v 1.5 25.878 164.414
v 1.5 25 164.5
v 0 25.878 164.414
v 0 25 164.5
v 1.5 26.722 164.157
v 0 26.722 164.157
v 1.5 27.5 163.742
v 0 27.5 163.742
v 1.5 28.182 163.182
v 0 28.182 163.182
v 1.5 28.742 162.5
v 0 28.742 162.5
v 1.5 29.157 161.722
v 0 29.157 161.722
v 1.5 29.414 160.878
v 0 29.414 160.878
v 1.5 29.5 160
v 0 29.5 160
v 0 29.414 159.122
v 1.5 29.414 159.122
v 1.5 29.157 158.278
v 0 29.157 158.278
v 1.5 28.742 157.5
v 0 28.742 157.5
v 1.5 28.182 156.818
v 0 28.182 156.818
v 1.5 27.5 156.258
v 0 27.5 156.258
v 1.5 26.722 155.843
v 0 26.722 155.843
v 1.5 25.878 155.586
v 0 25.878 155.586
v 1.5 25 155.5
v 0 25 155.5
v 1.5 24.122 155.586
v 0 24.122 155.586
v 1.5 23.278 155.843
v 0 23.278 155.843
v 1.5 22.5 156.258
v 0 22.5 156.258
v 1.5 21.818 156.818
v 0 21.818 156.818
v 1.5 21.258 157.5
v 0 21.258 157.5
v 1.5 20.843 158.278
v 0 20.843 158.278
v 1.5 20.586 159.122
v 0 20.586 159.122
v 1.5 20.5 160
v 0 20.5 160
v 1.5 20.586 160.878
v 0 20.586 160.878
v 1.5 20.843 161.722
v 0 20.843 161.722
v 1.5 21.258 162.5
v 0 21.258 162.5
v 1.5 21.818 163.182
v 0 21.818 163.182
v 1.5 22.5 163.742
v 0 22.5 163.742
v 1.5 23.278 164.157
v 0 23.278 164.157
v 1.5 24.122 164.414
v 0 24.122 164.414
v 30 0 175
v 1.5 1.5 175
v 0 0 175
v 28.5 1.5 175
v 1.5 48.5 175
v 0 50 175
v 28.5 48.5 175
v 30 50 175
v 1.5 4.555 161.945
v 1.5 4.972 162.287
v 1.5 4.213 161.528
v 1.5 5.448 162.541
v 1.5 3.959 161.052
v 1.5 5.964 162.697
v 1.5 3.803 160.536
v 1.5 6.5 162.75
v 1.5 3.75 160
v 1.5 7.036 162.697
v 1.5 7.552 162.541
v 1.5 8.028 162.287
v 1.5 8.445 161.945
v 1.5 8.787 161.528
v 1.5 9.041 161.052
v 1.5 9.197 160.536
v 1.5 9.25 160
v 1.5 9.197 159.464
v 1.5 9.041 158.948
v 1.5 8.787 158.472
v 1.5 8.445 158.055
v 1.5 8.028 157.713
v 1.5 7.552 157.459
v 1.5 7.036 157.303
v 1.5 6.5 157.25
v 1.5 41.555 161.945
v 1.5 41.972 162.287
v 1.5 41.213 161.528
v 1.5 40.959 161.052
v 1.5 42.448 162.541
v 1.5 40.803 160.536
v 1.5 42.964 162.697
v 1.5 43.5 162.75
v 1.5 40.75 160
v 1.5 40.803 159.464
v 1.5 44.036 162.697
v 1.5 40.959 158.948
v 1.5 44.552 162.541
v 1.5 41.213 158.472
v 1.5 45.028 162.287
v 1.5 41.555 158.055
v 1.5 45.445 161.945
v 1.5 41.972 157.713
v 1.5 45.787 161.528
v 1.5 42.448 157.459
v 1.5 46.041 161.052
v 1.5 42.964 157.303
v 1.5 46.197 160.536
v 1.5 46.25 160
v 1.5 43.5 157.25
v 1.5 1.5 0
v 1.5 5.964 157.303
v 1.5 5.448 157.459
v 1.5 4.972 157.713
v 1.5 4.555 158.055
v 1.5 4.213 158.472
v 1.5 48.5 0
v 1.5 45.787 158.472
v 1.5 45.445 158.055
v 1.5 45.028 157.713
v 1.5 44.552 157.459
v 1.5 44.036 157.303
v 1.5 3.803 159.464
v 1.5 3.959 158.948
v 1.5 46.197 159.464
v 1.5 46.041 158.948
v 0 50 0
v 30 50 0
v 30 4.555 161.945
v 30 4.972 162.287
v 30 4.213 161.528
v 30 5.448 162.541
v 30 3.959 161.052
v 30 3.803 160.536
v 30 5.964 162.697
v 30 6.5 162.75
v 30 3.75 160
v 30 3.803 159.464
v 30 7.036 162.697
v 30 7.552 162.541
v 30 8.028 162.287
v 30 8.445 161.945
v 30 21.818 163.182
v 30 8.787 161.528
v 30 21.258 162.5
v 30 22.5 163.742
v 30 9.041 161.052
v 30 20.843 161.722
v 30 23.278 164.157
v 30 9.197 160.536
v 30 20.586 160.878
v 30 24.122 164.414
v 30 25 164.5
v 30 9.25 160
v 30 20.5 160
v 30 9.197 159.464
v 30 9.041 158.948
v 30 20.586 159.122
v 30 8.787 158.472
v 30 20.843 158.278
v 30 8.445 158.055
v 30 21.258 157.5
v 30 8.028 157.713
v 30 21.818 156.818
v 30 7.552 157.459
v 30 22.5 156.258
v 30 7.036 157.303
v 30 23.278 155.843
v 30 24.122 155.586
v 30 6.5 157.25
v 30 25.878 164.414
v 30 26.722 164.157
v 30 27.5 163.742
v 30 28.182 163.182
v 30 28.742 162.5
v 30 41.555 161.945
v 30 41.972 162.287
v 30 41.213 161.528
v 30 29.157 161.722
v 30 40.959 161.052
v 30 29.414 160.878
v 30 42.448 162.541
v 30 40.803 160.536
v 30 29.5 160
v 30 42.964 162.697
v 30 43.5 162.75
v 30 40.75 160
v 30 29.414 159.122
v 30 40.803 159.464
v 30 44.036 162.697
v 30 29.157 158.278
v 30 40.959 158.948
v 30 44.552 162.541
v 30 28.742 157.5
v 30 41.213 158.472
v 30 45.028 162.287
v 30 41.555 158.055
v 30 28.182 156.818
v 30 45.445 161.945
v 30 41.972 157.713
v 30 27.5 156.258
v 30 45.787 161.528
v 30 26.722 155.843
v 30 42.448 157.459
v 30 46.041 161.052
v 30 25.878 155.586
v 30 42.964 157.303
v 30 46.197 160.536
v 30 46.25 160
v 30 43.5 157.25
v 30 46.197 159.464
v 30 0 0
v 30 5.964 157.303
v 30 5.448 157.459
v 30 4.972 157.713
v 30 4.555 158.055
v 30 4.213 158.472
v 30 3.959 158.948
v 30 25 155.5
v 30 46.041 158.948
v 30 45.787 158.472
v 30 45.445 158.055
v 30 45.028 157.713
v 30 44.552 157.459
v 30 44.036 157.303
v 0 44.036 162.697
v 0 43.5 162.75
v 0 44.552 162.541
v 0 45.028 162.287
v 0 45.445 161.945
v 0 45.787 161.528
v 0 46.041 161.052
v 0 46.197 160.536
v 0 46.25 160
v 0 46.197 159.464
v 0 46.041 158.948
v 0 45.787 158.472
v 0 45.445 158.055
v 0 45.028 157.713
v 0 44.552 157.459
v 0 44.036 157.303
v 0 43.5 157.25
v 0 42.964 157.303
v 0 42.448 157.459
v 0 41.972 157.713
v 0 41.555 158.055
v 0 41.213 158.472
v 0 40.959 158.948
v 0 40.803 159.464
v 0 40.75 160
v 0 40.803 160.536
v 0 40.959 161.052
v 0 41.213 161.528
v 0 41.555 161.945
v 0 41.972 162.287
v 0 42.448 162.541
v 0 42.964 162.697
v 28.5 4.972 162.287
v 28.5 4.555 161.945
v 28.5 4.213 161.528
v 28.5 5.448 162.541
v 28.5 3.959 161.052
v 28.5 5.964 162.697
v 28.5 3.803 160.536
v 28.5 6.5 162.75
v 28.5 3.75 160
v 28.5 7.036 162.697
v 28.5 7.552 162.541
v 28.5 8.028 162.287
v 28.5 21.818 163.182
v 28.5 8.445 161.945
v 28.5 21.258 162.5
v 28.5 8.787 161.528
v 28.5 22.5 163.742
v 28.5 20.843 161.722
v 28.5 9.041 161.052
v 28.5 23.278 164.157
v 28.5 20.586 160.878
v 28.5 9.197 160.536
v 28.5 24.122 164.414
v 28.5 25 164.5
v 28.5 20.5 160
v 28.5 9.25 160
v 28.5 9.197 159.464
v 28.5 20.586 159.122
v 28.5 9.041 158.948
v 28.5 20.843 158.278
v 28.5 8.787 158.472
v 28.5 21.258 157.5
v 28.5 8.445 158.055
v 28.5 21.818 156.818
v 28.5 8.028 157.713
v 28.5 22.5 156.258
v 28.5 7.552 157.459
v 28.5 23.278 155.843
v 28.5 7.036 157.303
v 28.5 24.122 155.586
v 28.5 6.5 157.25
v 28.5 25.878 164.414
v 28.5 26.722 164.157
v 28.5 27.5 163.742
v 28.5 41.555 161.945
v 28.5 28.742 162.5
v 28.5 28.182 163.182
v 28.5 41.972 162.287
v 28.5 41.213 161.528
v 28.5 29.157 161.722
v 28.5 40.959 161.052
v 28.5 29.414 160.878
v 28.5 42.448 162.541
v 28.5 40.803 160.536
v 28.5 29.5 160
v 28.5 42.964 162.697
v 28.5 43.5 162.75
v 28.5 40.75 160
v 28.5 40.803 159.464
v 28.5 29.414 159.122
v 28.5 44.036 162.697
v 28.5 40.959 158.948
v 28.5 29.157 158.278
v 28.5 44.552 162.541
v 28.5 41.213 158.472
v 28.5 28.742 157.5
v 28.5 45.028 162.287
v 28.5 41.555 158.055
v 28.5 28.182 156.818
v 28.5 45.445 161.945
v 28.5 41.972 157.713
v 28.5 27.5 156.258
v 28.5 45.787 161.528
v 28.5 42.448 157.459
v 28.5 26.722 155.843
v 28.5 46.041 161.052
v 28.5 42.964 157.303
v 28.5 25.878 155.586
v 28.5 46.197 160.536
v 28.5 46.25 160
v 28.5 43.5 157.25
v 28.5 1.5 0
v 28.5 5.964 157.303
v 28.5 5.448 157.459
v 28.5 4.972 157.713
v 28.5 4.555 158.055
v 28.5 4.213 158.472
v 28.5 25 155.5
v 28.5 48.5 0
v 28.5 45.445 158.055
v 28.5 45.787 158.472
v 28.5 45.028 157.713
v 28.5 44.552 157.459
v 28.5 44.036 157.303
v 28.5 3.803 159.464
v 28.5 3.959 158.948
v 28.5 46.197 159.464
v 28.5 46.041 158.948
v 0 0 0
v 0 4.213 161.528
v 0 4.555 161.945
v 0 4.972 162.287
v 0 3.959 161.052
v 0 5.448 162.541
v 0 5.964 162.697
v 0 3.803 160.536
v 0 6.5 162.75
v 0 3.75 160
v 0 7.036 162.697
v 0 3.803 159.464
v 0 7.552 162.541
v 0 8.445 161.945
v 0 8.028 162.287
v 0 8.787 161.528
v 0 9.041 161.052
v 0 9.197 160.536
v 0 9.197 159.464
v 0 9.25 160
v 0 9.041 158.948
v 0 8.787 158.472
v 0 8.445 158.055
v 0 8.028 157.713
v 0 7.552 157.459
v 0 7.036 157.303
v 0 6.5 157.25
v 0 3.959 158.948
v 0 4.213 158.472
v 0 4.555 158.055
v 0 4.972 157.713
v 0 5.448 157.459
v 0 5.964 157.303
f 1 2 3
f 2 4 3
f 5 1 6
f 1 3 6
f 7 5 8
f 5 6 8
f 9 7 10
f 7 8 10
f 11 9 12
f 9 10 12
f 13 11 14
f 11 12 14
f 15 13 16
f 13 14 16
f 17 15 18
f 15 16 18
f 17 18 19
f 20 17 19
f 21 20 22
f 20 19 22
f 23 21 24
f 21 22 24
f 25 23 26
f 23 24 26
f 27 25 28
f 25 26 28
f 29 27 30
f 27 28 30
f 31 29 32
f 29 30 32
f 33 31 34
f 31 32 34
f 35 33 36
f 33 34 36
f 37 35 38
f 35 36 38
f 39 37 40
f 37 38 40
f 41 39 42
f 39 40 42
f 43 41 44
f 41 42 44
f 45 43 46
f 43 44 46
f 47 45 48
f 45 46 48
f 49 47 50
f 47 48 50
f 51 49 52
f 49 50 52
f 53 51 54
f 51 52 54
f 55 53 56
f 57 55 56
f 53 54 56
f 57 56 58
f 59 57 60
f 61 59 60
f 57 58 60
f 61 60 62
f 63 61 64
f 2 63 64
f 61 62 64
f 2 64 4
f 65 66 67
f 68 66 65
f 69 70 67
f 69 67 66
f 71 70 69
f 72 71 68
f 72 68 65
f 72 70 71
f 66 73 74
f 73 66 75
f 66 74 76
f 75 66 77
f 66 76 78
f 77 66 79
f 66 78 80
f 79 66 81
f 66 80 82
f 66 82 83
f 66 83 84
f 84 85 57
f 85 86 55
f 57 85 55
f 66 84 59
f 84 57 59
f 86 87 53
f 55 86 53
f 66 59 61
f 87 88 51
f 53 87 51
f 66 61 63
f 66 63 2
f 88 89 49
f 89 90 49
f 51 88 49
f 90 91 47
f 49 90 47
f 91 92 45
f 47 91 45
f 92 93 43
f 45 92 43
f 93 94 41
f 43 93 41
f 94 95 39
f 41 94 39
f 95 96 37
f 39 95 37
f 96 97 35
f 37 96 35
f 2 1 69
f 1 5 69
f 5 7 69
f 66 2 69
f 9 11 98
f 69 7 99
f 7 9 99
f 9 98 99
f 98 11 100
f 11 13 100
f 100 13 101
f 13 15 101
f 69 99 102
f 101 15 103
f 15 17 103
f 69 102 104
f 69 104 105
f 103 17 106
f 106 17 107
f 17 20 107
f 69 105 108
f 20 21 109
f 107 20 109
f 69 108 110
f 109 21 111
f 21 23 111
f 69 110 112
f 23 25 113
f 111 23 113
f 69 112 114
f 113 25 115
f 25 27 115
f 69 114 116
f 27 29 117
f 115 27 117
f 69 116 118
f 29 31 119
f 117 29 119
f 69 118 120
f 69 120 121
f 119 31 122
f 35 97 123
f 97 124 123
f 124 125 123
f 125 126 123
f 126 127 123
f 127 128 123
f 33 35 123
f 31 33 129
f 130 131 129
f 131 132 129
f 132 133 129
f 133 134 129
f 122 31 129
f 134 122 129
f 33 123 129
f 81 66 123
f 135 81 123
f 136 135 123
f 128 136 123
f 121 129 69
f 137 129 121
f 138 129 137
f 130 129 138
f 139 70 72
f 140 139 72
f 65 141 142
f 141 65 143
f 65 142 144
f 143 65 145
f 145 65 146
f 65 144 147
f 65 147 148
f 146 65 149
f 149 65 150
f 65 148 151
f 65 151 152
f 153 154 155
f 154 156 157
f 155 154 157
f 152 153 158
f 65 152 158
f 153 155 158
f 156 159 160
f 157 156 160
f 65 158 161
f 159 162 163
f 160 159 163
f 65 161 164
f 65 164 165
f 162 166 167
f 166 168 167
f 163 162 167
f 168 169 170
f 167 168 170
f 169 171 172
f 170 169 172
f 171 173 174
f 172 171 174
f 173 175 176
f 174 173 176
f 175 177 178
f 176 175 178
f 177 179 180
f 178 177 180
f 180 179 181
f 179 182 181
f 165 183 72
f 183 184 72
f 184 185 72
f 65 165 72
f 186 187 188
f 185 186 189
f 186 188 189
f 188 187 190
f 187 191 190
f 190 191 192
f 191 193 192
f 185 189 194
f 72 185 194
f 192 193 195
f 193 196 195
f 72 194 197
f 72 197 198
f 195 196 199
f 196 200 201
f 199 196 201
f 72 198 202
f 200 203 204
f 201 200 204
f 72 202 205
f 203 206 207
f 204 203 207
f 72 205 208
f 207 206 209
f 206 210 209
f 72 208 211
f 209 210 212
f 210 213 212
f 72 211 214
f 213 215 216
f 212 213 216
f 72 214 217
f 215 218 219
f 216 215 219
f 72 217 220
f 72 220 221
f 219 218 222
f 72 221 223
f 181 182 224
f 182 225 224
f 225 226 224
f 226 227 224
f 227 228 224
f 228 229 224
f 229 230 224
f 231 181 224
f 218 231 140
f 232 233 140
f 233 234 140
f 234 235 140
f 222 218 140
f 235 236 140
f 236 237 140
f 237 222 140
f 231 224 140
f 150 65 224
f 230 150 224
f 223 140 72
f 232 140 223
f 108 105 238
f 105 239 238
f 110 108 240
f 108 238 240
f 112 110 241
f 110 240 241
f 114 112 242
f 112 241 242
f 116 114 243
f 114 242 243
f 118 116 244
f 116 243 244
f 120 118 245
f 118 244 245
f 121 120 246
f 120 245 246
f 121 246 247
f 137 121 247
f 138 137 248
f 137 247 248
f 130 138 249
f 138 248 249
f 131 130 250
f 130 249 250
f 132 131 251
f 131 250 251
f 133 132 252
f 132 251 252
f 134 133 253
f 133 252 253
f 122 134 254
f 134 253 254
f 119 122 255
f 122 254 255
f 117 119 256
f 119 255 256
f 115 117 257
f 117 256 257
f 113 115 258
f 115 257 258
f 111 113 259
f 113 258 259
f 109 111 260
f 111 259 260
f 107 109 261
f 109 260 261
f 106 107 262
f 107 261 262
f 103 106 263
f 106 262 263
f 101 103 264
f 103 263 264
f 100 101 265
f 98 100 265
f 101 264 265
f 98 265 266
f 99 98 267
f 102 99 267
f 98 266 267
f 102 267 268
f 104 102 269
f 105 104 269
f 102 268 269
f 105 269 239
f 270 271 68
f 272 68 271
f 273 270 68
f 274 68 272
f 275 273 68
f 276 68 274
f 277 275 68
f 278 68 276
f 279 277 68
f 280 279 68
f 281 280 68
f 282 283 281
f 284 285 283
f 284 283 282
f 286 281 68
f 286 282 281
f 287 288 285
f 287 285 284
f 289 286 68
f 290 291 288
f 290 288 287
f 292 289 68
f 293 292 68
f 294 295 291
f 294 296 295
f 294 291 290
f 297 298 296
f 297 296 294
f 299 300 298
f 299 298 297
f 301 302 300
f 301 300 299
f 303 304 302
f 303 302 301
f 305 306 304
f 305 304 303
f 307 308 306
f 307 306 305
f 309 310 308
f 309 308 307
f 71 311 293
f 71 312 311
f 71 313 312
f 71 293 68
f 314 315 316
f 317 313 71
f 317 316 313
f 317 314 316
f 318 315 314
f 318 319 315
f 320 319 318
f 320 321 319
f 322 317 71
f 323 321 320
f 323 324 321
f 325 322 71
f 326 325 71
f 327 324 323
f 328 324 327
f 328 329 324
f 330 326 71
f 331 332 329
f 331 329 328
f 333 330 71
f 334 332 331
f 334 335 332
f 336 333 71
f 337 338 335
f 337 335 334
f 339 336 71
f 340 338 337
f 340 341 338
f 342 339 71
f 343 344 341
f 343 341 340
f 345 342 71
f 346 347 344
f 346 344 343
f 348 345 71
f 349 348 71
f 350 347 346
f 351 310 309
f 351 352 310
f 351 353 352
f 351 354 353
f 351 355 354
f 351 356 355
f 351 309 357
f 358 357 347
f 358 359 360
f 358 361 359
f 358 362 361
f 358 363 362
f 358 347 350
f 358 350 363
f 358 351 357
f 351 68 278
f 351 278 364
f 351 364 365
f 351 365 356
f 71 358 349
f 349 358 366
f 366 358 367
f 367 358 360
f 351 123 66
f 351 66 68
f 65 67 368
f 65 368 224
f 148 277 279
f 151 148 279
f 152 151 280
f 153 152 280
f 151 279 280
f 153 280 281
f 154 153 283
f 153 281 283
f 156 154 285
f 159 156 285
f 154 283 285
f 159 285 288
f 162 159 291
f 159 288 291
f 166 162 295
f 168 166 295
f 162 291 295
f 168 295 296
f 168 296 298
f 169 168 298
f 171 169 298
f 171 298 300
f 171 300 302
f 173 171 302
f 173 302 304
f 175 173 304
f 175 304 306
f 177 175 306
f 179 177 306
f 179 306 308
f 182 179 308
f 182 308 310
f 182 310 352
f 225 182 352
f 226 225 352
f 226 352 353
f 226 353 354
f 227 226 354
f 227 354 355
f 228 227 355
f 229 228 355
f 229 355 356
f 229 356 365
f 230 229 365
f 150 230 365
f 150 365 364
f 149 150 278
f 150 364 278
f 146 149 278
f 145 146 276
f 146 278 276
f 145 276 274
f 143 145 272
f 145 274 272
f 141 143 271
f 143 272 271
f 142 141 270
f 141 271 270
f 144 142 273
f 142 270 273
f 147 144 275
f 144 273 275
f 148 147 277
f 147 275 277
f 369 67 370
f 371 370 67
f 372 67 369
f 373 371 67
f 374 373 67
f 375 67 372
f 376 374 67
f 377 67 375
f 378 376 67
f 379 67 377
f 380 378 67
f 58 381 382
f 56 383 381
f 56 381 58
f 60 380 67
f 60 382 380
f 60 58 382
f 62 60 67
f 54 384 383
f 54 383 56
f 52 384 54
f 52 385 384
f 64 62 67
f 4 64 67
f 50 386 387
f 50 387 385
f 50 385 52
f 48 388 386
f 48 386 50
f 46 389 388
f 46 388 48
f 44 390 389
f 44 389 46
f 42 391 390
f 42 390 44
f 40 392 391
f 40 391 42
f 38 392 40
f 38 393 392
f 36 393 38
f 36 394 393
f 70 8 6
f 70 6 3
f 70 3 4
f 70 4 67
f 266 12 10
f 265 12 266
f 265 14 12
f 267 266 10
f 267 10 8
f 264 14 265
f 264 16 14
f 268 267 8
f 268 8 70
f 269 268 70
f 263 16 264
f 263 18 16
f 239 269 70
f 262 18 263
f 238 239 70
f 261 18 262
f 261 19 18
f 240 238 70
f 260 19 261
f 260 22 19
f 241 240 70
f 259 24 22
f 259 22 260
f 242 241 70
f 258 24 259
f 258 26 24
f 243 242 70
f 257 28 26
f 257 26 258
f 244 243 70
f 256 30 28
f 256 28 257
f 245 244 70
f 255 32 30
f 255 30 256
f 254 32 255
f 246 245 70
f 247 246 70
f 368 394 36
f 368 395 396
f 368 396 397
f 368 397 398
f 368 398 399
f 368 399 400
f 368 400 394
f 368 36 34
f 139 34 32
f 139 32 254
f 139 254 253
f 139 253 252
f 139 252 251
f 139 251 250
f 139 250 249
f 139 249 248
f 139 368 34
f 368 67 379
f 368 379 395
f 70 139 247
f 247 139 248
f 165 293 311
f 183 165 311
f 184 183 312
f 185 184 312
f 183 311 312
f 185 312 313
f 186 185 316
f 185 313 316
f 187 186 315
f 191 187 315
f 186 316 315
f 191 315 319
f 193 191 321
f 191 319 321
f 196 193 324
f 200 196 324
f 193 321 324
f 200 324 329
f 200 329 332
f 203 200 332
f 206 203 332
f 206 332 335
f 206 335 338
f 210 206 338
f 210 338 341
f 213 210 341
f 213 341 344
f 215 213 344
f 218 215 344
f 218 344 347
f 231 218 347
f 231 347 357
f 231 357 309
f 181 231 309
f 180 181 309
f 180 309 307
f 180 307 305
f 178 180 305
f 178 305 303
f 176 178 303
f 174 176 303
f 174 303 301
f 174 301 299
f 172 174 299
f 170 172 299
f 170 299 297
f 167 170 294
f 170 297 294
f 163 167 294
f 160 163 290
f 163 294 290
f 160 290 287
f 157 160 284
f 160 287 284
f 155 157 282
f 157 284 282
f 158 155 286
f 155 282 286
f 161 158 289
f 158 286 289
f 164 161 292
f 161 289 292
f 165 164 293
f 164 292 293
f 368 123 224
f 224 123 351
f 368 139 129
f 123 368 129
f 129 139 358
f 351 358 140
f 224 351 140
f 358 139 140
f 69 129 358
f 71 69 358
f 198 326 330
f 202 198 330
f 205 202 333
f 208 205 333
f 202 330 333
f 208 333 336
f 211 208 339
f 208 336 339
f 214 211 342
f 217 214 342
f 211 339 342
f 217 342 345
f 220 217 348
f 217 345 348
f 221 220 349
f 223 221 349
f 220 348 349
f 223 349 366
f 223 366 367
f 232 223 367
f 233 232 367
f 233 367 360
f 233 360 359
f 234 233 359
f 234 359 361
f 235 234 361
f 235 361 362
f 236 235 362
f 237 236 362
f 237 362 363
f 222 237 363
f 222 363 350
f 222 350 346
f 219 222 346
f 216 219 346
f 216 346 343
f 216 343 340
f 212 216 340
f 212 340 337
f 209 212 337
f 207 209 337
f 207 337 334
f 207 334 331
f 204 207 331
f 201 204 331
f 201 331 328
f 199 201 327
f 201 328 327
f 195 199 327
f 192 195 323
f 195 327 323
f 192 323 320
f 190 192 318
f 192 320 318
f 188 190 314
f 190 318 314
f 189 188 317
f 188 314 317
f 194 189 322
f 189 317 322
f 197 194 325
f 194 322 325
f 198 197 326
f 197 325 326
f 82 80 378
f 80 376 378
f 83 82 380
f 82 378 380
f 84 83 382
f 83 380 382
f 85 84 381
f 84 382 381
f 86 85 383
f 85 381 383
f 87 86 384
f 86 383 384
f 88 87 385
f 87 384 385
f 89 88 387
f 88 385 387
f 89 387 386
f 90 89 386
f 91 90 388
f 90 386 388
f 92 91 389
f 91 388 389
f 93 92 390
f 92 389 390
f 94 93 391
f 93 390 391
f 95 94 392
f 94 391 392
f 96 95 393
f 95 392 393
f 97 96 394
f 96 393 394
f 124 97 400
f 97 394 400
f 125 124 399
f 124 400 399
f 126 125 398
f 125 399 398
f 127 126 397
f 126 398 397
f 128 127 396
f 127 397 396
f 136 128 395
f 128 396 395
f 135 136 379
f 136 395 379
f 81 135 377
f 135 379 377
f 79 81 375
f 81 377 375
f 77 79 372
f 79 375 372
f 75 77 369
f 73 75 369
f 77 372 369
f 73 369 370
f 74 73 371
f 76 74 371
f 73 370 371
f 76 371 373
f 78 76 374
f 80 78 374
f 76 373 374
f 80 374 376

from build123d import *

# Parameters (mm, degrees)
ESBO_O1_W                   = 30
ESBO_O1_H                   = 50
ESBO_O1_W_2                 = 27
ESBO_O1_H_2                 = 47
RESSALTO_EXTRUS_O1_DEPTH    = 175
FURO_COM_FOLGA_DE_M53_D     = 5.5
FURO_COM_FOLGA_DE_M53_DEPTH = 30
FURO_COM_FOLGA_DE_M53_TIP   = 1.652366702
FURO_COM_FOLGA_DE_M85_D     = 9
FURO_COM_FOLGA_DE_M85_DEPTH = 30
FURO_COM_FOLGA_DE_M85_TIP   = 2.703872786


with BuildPart() as part:
    # Esboço1 → Ressalto-extrusão1 (new body)
    with BuildSketch(Plane.XY):
        with Locations((15, 25)):
            Rectangle(ESBO_O1_W, ESBO_O1_H)
        with Locations((15, 25)):
            Rectangle(ESBO_O1_W_2, ESBO_O1_H_2, mode=Mode.SUBTRACT)
    extrude(amount=RESSALTO_EXTRUS_O1_DEPTH)

    # Furo com folga de M53
    with Locations(Plane(origin=(30, 0, 0), x_dir=(0, 0, -1), z_dir=(1, 0, 0))):
        with Locations((-160, 43.5), (-160, 6.5)):
            Hole(FURO_COM_FOLGA_DE_M53_D / 2, depth=FURO_COM_FOLGA_DE_M53_DEPTH)
            with Locations((0, 0, -(FURO_COM_FOLGA_DE_M53_DEPTH + FURO_COM_FOLGA_DE_M53_TIP / 2))):  # 118° drill point
                Cone(0, FURO_COM_FOLGA_DE_M53_D / 2, FURO_COM_FOLGA_DE_M53_TIP, mode=Mode.SUBTRACT)

    # Furo com folga de M85
    with Locations(Plane(origin=(30, 0, 0), x_dir=(0, 0, -1), z_dir=(1, 0, 0))):
        with Locations((-160, 25)):
            Hole(FURO_COM_FOLGA_DE_M85_D / 2, depth=FURO_COM_FOLGA_DE_M85_DEPTH)
            with Locations((0, 0, -(FURO_COM_FOLGA_DE_M85_DEPTH + FURO_COM_FOLGA_DE_M85_TIP / 2))):  # 118° drill point
                Cone(0, FURO_COM_FOLGA_DE_M85_D / 2, FURO_COM_FOLGA_DE_M85_TIP, mode=Mode.SUBTRACT)


solid = part.part
